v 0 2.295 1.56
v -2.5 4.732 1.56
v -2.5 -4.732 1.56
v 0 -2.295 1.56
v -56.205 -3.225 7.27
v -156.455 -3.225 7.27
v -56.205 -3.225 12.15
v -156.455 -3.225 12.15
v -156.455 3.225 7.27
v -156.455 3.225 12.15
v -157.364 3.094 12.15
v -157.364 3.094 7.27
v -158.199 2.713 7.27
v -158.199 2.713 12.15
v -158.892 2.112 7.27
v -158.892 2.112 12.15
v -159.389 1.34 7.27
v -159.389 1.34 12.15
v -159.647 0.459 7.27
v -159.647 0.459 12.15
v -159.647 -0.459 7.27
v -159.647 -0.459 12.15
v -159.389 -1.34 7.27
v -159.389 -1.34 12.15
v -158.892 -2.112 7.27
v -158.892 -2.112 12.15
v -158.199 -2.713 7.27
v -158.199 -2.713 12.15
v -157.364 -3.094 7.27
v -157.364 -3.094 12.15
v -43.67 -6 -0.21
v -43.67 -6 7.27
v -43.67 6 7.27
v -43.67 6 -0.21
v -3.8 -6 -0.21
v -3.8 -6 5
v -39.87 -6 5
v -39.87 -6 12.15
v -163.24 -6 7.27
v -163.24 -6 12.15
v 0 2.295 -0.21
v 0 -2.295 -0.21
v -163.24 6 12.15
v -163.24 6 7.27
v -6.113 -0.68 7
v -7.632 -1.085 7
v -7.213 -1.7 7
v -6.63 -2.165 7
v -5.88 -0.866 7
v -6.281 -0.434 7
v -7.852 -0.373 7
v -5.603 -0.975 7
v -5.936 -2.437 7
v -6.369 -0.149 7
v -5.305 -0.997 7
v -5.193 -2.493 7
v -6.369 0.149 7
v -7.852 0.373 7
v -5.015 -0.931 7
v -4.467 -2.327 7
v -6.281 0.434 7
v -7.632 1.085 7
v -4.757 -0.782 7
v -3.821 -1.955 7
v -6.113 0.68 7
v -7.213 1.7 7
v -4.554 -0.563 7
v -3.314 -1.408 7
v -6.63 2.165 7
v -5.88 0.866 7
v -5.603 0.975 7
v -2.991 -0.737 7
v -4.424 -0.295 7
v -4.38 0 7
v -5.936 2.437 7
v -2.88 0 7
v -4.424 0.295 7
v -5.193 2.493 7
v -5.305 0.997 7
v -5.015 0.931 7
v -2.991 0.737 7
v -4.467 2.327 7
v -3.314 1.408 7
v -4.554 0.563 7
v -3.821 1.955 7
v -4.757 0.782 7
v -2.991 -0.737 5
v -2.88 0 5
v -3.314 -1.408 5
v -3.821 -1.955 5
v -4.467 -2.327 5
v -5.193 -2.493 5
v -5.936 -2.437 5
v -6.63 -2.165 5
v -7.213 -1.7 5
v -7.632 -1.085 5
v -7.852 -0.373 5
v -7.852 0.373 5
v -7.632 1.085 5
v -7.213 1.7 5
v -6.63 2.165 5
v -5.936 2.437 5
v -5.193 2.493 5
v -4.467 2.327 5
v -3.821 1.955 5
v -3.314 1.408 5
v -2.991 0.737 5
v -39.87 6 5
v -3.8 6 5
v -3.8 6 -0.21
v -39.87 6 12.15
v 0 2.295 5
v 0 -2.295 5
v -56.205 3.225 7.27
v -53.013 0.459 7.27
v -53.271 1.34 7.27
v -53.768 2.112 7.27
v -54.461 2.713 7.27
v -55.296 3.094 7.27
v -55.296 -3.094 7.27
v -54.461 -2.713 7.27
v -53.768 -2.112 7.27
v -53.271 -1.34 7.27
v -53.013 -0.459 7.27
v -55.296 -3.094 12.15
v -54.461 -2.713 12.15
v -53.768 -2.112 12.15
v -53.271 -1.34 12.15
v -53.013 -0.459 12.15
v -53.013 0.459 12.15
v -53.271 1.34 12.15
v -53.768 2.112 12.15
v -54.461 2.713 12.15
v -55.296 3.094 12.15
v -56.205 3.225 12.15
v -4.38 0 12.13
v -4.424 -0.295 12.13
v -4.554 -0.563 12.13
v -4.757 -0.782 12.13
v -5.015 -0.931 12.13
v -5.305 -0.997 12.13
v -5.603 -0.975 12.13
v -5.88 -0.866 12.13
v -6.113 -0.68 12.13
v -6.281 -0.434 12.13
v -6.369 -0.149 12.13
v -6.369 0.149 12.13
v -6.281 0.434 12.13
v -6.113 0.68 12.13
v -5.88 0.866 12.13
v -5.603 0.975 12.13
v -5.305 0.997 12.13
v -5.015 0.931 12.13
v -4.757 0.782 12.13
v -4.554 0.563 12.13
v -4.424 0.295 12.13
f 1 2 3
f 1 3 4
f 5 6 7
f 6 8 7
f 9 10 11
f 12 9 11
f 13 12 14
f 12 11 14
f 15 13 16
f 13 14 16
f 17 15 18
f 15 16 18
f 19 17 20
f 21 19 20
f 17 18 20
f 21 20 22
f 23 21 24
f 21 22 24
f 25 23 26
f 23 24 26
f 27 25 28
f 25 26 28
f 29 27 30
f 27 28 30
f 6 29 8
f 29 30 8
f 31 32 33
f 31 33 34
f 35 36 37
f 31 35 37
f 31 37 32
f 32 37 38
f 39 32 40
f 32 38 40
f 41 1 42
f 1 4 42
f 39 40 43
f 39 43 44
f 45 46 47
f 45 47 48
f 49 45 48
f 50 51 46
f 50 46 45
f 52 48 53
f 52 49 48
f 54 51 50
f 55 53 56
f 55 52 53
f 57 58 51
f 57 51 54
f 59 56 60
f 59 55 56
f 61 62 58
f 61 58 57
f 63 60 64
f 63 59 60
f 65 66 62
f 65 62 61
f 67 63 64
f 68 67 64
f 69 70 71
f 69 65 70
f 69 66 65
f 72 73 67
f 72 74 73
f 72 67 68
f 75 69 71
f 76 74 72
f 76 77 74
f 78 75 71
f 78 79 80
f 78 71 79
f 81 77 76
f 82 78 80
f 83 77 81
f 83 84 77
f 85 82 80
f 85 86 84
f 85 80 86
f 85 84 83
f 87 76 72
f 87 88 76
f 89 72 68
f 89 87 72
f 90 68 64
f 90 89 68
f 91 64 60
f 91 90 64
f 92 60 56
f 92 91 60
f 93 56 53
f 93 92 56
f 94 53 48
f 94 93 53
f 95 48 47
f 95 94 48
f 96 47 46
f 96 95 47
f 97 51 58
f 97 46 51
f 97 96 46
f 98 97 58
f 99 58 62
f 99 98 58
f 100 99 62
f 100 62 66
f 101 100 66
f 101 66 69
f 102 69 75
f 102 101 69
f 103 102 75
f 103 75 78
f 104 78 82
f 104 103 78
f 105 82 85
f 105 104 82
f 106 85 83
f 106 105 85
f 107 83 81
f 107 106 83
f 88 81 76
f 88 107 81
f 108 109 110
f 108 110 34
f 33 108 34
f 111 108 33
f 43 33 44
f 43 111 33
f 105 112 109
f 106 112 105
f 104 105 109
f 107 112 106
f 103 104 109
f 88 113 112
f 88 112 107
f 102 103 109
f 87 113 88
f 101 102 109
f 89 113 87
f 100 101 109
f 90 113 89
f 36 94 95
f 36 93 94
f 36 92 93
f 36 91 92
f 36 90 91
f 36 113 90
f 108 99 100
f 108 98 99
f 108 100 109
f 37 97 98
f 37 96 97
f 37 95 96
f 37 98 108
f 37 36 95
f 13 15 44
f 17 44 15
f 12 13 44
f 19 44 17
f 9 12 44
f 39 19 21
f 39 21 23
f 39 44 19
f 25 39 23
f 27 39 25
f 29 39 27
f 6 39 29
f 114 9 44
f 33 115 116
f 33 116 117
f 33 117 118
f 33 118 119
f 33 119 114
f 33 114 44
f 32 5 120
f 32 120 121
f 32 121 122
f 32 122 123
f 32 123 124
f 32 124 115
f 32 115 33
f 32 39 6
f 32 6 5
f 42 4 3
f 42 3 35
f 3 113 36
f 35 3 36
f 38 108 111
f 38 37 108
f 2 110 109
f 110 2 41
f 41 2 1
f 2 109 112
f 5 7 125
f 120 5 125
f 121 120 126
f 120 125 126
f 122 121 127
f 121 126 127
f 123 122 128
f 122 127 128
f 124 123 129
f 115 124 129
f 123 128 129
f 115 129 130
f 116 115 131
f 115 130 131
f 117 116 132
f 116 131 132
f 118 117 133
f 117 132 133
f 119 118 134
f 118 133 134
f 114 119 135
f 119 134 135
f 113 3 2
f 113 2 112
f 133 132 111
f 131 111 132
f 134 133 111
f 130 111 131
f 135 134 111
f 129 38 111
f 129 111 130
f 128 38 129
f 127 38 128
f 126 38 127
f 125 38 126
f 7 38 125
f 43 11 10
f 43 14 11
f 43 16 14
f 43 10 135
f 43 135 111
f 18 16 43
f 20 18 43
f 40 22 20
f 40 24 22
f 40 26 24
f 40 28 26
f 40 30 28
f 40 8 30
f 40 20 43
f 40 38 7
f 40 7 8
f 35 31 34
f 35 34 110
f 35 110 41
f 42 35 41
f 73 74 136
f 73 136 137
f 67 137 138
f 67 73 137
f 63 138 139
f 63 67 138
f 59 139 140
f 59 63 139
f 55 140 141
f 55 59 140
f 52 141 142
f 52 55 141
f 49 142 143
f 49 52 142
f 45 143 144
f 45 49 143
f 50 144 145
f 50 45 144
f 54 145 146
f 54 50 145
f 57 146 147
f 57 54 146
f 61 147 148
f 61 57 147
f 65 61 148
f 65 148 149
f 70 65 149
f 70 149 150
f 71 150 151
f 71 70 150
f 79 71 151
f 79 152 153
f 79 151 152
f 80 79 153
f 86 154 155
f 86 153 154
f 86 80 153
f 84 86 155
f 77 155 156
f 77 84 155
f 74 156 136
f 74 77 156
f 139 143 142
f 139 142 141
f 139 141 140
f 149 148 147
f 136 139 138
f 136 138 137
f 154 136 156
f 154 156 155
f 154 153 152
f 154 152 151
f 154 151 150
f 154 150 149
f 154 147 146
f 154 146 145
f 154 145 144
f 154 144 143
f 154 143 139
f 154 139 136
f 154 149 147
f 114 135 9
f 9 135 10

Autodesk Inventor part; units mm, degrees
ref_plane "YZ Plane" through (0, 0, 0) normal (1, 0, 0) x (0, 1, 0)
sketch "Esboço1" plane through (0, 0, 0) normal (0, 1, 0) x (-1, 0, 0)
  line L0 (0, 5) -> (39.87, 5)
  line L1 (39.87, 5) -> (39.87, 12.15)
  line L2 (39.87, 12.15) -> (163.24, 12.15)
  line L3 (163.24, 12.15) -> (163.24, 7.27)
  line L4 (163.24, 7.27) -> (43.67, 7.27)
  line L5 (43.67, 7.27) -> (43.67, -0.21)
  line L6 (43.67, -0.21) -> (0, -0.21)
  line L7 (0, 5) -> (2.5, 5) construction
  line L8 (2.5, 5) -> (2.5, 1.56) construction
  line L9 (2.5, 1.56) -> (0, 1.56) construction
  line L10 (2.5, 1.56) -> (0, 5)
  line L11 (2.5, 1.56) -> (0, 1.56)
  line L12 (0, 1.56) -> (0, -0.21)
  point P0 (0, 0)
  dimension "d0" = 39.87
  dimension "d1" = 7.15
  dimension "d2" = 123.37
  dimension "d3" = 4.88
  dimension "d4" = 119.57
  dimension "d5" = 7.48
  dimension "d6" = 2.5
  dimension "d7" = 3.44
  dimension "d8" = 5.21
extrude "Extrusão1" add sketch "Esboço1" along normal mid plane 12
ref_plane "Plano de trabalho1" through (-163.24, 6, 12.15) normal (0, 0, 1) x (1, 0, 0)
ref_plane "Plano de trabalho2" through (-39.87, 6, 5) normal (0, 0, 1) x (1, 0, 0)
sketch "Esboço2" plane through (-163.24, 6, 12.15) normal (0, 0, 1) x (1, 0, 0)
  line L0 (123.37, 0) -> (123.37, -12) construction
  line L1 (123.37, -6) -> (110.26, -6) construction
  line L2 (0, 0) -> (0, -12) construction
  line L3 (0, -6) -> (3.56, -6) construction
  line L4 (110.26, -6) -> (0, -6) construction
  line L5 (3.56, -6) -> (110.26, -6) construction
  line L6 (6.785, -9.225) -> (107.035, -9.225)
  line L7 (107.035, -2.775) -> (6.785, -2.775)
  arc A0 (6.785, -2.775) -> (6.785, -9.225) centre (6.785, -6) ccw
  arc A1 (107.035, -9.225) -> (107.035, -2.775) centre (107.035, -6) ccw
  point P0 (163.24, -6)
  point P1 (55.13, -6)
  point P2 (56.91, -6)
  dimension "d13" = 13.11
  dimension "d14" = 3.56
  dimension "d16" = 6.45
extrude "Extrusão2" cut sketch "Esboço2" against normal blind 12
sketch "Esboço3" plane through (-39.87, 6, 5) normal (0, 0, 1) x (1, 0, 0)
  line L0 (-3.8, -12) -> (39.87, -12) construction
  line L1 (39.87, -12) -> (36.07, -12) construction
  line L2 (36.07, -12) -> (36.07, 0) construction
  line L3 (39.87, 0) -> (-3.8, 0) construction
  line L4 (39.87, -6) -> (39.87, -3.705) construction
  line L5 (39.87, 0) -> (39.87, -12) construction
  line L6 (39.87, -6) -> (39.87, -8.295) construction
  line L7 (39.87, -8.295) -> (36.07, -12)
  line L8 (39.87, -12) -> (36.07, -12)
  line L9 (39.87, -8.295) -> (39.87, -12)
  line L10 (36.07, 0) -> (39.87, -3.705)
  line L11 (39.87, 0) -> (39.87, -3.705)
  line L12 (39.87, 0) -> (36.07, 0)
  dimension "d19" = 3.8
  dimension "d20" = 2.295
  dimension "d21" = 2.295
extrude "Extrusão3" cut sketch "Esboço3" against normal blind 12
sketch "Esboço4" plane through (-39.87, 6, 5) normal (0, 0, 1) x (1, 0, 0)
  line L0 (39.87, -6) -> (34.49, -6) construction
  circle A0 centre (34.49, -6) radius 2.5
  dimension "d24" = 5.38
  dimension "d25" = 5
extrude "Extrusão4" add sketch "Esboço4" along normal blind 2
sketch "Esboço5" plane through (-5.38, 0, 7) normal (0, 0, 1) x (1, 0, 0)
  circle A0 centre (0, 0) radius 1
  point P0 (5.38, 0)
  dimension "d28" = 2
extrude "Extrusão5" add sketch "Esboço5" along normal blind 5.13
properties part number "pinças" material "Alumínio 6061"
